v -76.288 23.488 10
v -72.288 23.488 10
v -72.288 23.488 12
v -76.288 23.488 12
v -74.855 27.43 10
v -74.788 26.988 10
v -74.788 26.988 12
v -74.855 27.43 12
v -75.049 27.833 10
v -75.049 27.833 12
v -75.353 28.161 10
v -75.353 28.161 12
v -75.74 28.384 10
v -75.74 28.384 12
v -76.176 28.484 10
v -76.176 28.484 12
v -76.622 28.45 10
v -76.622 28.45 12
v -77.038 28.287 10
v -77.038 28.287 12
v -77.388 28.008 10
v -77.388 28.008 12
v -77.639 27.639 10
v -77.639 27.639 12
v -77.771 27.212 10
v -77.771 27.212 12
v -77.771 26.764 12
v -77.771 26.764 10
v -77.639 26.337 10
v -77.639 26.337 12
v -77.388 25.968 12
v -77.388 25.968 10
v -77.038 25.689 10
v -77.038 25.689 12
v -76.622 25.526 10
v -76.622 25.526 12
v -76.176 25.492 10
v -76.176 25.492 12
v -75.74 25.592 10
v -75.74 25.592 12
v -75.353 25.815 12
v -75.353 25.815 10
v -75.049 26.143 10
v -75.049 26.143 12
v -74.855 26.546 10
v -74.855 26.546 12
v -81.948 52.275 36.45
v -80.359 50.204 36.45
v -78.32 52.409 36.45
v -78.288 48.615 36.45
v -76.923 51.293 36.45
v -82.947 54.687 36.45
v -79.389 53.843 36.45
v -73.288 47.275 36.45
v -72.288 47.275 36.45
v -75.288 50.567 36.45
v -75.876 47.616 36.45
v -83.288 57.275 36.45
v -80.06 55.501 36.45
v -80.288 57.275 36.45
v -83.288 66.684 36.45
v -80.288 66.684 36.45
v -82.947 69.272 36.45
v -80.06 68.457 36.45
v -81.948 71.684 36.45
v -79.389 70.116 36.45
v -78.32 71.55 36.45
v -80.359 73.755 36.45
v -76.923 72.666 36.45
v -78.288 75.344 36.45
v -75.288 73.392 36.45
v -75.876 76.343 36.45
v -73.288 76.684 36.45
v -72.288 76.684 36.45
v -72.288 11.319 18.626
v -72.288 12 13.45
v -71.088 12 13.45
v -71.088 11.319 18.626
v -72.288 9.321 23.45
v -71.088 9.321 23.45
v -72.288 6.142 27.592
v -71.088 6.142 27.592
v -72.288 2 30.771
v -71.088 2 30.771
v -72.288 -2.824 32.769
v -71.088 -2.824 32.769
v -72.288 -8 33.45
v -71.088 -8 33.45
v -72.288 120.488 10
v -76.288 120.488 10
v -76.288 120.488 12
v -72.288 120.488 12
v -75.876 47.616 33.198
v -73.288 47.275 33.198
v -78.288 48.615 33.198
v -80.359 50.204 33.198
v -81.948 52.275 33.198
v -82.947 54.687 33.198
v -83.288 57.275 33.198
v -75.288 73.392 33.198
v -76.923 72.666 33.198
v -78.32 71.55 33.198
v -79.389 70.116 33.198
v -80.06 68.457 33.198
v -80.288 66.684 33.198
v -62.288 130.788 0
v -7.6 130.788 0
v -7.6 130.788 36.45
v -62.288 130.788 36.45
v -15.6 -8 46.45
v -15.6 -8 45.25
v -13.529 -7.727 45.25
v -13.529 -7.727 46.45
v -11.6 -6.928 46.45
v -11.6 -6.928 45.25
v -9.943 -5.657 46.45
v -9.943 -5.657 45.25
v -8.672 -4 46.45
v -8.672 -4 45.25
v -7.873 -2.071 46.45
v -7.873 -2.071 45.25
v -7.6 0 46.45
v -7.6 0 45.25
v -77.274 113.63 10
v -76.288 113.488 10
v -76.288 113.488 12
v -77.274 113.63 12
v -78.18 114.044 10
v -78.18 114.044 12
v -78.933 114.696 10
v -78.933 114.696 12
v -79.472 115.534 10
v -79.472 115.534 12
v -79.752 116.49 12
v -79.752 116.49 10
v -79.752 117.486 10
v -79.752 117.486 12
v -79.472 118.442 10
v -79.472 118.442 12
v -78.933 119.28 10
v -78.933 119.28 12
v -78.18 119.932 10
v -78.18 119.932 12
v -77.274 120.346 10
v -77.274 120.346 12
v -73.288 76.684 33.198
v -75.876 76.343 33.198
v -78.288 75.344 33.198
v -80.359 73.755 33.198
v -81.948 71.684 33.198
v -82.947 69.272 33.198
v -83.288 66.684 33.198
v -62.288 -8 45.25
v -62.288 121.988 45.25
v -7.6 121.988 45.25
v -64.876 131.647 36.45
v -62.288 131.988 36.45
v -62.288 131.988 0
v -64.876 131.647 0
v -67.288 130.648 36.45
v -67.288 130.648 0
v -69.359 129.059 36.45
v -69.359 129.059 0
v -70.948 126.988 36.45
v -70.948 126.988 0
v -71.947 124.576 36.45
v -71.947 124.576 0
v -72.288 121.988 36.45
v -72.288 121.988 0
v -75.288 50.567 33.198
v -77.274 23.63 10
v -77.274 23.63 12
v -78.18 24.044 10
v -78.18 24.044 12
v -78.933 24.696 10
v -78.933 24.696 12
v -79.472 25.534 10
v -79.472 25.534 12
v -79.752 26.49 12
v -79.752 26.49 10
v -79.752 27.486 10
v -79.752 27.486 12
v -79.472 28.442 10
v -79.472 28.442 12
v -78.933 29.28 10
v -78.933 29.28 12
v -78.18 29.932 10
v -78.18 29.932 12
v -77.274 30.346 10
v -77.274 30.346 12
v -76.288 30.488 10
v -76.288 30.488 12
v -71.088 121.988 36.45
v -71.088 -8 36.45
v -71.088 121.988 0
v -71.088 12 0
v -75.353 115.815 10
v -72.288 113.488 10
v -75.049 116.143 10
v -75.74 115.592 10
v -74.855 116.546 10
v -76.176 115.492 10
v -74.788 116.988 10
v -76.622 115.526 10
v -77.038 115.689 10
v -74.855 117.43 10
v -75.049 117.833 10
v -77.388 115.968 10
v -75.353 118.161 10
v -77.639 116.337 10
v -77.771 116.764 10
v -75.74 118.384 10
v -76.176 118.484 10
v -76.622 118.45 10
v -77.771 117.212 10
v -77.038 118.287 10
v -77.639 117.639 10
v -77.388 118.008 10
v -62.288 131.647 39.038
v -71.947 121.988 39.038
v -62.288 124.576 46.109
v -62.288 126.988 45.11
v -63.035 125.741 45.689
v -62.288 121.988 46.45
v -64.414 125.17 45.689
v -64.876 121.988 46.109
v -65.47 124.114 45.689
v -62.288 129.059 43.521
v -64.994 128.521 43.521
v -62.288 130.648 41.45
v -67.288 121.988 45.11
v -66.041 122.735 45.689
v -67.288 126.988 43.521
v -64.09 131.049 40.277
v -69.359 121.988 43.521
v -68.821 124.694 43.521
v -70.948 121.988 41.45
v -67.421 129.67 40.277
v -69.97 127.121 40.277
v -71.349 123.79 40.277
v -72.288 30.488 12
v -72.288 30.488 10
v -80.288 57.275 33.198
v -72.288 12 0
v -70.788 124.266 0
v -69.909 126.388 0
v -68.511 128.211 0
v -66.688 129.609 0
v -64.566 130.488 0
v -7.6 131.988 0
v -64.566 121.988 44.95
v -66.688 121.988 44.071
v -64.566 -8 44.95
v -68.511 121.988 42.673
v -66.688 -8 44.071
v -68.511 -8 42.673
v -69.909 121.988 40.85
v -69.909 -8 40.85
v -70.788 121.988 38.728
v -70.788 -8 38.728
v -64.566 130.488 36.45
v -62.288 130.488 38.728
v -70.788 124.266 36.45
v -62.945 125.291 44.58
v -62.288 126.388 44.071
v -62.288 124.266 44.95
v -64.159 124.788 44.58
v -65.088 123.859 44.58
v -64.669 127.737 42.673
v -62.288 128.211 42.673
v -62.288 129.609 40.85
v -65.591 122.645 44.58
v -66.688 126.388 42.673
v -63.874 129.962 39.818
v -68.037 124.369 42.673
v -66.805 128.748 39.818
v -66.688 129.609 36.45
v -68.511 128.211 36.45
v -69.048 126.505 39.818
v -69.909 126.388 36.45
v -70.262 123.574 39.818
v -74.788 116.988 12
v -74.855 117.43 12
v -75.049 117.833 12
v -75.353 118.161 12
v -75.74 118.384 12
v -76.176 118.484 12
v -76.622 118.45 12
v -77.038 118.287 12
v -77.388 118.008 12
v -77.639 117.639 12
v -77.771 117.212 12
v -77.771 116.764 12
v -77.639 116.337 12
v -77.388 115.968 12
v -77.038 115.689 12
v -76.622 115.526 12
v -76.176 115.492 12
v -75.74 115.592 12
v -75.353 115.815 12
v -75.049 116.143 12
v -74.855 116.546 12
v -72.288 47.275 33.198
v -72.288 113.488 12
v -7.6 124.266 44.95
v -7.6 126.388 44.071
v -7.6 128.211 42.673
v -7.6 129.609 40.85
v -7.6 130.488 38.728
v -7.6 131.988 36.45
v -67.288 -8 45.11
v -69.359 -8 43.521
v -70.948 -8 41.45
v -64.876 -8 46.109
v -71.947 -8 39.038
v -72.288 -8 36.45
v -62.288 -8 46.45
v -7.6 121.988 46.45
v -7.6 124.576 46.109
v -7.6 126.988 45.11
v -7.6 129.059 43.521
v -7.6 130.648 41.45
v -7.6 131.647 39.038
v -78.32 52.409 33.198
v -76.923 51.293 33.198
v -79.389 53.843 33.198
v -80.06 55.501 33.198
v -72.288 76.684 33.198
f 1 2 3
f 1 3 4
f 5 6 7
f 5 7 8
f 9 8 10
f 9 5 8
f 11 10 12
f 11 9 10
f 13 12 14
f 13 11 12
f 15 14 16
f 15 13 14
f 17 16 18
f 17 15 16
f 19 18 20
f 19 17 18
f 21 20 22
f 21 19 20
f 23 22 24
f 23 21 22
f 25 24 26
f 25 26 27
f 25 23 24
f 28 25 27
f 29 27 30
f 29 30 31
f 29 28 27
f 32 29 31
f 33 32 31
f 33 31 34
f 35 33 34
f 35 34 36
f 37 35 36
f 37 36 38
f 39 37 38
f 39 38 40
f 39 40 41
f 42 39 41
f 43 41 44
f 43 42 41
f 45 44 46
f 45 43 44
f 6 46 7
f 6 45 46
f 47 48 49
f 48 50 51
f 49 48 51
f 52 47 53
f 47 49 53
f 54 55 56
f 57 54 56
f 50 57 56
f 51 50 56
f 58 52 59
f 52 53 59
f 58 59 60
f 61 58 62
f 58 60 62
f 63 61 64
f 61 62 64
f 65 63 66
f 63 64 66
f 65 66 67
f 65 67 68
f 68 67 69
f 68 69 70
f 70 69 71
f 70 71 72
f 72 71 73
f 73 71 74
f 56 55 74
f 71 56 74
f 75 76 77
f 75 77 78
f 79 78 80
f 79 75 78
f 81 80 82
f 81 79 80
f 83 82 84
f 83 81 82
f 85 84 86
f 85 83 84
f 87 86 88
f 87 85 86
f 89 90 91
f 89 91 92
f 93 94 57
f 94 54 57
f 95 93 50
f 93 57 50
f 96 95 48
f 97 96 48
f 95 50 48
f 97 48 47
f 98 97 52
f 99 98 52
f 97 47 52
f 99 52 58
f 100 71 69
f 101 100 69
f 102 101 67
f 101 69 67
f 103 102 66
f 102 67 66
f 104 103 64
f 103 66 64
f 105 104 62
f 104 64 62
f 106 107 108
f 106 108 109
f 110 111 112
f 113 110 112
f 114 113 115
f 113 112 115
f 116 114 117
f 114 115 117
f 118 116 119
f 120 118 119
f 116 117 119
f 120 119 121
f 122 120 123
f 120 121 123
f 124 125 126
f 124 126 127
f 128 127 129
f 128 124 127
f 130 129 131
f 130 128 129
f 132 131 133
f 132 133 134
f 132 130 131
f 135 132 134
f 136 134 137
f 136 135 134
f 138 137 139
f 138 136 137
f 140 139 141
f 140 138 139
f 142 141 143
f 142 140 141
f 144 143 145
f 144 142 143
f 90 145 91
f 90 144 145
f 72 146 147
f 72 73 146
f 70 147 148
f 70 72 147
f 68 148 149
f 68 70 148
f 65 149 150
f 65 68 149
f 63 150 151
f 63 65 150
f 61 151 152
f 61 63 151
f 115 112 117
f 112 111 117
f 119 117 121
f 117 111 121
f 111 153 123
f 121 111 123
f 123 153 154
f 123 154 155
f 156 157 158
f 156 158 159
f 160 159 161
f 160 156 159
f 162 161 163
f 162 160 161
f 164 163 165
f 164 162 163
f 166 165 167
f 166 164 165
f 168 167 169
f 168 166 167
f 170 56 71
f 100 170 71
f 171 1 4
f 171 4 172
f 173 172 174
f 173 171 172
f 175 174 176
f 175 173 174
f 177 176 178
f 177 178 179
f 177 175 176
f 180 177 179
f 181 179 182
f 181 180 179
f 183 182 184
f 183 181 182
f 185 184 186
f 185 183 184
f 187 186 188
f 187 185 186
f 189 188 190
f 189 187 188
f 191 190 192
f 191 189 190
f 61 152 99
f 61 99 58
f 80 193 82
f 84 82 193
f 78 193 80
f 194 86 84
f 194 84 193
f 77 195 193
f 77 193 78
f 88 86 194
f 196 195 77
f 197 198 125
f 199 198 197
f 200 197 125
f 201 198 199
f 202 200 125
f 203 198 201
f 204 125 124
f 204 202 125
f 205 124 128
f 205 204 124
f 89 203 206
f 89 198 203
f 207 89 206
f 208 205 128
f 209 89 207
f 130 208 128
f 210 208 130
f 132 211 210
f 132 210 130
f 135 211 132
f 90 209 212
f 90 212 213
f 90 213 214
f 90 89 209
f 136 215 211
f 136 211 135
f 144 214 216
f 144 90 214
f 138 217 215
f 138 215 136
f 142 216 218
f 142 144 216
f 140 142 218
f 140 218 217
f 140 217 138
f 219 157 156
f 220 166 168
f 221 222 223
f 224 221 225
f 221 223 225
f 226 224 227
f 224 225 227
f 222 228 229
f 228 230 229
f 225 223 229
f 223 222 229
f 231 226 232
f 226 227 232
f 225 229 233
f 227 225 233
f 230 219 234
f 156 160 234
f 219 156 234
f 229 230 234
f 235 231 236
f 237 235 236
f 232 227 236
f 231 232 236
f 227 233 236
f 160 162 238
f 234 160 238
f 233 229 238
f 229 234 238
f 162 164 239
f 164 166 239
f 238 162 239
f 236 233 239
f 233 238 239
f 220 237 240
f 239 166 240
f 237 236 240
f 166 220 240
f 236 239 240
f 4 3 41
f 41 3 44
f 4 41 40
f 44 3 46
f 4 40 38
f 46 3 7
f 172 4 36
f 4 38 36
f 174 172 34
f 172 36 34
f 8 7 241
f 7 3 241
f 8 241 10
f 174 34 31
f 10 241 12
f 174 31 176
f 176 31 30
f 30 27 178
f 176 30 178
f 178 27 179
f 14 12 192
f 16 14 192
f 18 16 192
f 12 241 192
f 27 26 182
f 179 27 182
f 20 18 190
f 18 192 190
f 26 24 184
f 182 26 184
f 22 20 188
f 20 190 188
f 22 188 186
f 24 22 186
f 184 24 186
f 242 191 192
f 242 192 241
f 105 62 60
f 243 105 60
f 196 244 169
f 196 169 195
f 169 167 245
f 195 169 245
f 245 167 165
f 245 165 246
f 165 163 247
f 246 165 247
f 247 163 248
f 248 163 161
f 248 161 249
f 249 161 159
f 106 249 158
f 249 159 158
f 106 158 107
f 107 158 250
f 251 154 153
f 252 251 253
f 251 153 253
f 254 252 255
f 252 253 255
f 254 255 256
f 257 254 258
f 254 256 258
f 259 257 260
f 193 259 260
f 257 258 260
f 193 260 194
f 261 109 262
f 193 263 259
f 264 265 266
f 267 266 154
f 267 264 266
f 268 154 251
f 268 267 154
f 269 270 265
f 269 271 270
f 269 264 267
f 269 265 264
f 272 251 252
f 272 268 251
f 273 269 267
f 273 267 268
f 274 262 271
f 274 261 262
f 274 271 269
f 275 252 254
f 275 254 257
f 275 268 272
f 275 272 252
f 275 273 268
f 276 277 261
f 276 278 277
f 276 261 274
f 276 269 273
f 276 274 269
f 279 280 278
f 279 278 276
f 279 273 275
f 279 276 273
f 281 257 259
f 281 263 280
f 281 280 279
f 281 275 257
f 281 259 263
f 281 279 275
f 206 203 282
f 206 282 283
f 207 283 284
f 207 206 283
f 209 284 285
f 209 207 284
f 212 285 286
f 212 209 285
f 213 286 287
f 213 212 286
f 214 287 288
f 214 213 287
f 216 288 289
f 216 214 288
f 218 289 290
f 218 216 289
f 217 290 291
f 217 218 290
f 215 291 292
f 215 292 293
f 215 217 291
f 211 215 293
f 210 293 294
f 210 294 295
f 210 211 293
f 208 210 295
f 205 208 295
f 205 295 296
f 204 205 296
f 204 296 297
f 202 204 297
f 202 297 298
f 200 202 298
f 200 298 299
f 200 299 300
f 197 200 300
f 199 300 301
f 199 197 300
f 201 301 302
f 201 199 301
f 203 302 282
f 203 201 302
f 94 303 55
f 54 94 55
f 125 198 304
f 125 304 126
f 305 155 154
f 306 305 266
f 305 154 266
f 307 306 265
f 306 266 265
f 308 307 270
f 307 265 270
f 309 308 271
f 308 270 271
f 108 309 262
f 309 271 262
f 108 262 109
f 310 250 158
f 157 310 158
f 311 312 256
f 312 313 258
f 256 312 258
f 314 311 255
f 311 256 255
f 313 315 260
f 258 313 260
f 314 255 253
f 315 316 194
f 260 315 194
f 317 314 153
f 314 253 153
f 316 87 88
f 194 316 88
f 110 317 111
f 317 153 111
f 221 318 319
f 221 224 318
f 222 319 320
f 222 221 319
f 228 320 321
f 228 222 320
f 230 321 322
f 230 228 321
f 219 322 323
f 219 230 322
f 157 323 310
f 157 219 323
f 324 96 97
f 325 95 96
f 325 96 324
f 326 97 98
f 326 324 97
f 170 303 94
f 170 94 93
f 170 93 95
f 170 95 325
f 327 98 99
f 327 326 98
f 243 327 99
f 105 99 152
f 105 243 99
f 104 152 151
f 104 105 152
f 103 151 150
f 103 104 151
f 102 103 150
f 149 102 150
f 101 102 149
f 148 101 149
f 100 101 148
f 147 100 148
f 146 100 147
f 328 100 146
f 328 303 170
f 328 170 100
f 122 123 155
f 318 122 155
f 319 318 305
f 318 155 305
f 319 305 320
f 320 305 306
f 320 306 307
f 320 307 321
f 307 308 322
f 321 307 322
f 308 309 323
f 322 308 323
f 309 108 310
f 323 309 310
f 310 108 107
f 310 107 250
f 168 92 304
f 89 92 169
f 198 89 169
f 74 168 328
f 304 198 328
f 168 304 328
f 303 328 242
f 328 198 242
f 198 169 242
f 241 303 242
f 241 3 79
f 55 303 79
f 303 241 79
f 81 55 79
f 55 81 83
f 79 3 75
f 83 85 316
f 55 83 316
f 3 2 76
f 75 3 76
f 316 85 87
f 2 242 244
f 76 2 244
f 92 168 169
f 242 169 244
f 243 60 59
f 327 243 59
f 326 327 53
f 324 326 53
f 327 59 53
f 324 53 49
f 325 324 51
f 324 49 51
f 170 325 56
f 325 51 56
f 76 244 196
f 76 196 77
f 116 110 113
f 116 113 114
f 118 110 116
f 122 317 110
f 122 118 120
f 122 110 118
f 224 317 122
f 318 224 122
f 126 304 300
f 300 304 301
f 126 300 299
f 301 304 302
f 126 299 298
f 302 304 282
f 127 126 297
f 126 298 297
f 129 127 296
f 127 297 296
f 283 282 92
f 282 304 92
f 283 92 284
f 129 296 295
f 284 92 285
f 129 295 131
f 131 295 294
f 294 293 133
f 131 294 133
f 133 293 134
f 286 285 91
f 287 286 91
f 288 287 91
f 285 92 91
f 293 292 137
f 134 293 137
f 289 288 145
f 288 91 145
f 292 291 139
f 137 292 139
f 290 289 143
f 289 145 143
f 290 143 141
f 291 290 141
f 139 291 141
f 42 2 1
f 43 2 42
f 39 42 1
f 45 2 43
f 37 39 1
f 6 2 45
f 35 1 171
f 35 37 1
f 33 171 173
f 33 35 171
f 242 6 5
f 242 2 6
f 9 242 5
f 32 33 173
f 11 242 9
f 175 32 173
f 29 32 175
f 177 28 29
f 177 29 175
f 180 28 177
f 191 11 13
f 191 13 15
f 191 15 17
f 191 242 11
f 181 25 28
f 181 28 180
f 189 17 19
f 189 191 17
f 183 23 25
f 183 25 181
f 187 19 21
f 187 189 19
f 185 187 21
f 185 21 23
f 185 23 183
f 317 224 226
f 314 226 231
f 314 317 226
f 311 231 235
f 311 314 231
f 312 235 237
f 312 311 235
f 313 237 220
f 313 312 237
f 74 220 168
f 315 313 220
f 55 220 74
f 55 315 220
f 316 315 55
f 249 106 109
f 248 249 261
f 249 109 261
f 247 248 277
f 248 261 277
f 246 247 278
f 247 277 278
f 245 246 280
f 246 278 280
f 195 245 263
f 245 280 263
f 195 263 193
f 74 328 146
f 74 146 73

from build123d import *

# Parameters (mm, degrees)
BOSS_EXTRUDE1_DEPTH = 46.45
FILLET1_R           = 10
FILLET2_R           = 10
SHELL1_T            = -1.2
BOSS_EXTRUDE2_START = 10
SKETCH2_R           = 1.5
BOSS_EXTRUDE2_DEPTH = 2
CUT_EXTRUDE1_DEPTH  = 1.2
SKETCH4_W           = 3.252453774
SKETCH4_H           = 29.408591544
BOSS_EXTRUDE3_DEPTH = 11
FILLET3_R           = 10
CUT_EXTRUDE2_DEPTH  = 3.252453774


with BuildPart() as part:
    # Sketch1 → Boss-Extrude1 (new body)
    with BuildSketch(Plane.XY):
        with BuildLine():
            Line((-7.6, 131.988), (-72.288, 131.988))
            Line((-72.288, 131.988), (-72.288, -8))
            Line((-72.288, -8), (-15.6, -8))
            ThreePointArc((-15.6, -8), (-9.943145751, -5.656854249), (-7.6, 0))
            Line((-7.6, 0), (-7.6, 131.988))
        make_face()
    extrude(amount=BOSS_EXTRUDE1_DEPTH)

    # Fillet1
    fillet1_edges = [part.edges().sort_by_distance(p)[0] for p in [
        (-72.288, 131.988, 23.225),
    ]]
    fillet(fillet1_edges, radius=FILLET1_R)

    # Fillet2
    fillet2_edges = [part.edges().sort_by_distance(p)[0] for p in [
        (-72.288, 56.994, 46.45),
        (-69.359067812, 129.059067812, 46.45),
        (-34.944, 131.988, 46.45),
    ]]
    fillet(fillet2_edges, radius=FILLET2_R)

    # Shell1
    shell1_openings = [part.faces().sort_by_distance(p)[0] for p in [
        (-7.6, 65.770031668, 23.151264626),
        (-43.729452835, -8, 23.052515396),
        (-9.943145751, -5.656854249, 23.225),
        (-39.918891594, 61.936645467, 0),
    ]]
    offset(amount=SHELL1_T, openings=shell1_openings, kind=Kind.INTERSECTION)

    # Sketch2 → Boss-Extrude2 (add)
    # profile 1 of 2: a face of its own
    with BuildSketch(Plane.XY.offset(BOSS_EXTRUDE2_START)):
        with BuildLine():
            Line((-76.288, 120.488), (-72.288, 120.488))
            Line((-72.288, 120.488), (-72.288, 113.488))
            Line((-72.288, 113.488), (-76.288, 113.488))
            ThreePointArc((-76.288, 113.488), (-79.788, 116.988), (-76.288, 120.488))
        make_face()
        with Locations((-76.288, 116.988)):
            Circle(SKETCH2_R, mode=Mode.SUBTRACT)
    # profile 2 of 2: a face of its own
    with BuildSketch(Plane.XY.offset(BOSS_EXTRUDE2_START)):
        with BuildLine():
            Line((-76.288, 30.488), (-72.288, 30.488))
            Line((-72.288, 30.488), (-72.288, 23.488))
            Line((-72.288, 23.488), (-76.288, 23.488))
            ThreePointArc((-76.288, 23.488), (-79.788, 26.988), (-76.288, 30.488))
        make_face()
        with Locations((-76.288, 26.988)):
            Circle(SKETCH2_R, mode=Mode.SUBTRACT)
    extrude(amount=BOSS_EXTRUDE2_DEPTH)

    # Sketch3 → Cut-Extrude1 (cut)
    with BuildSketch(Plane.ZY.offset(72.288)):
        with BuildLine():
            Line((0, 12), (13.45, 12))
            ThreePointArc((13.45, 12), (33.45, -8), (13.45, -28))
            Line((13.45, -28), (0, -28))
            ThreePointArc((0, -28), (-20, -8), (0, 12))
        make_face()
    extrude(amount=-CUT_EXTRUDE1_DEPTH, mode=Mode.SUBTRACT)

    # Sketch4 → Boss-Extrude3 (add)
    with BuildSketch(Plane.ZY.offset(72.288)):
        with Locations((34.823773113, 61.979262262)):
            Rectangle(SKETCH4_W, SKETCH4_H)
    extrude(amount=BOSS_EXTRUDE3_DEPTH)

    # Fillet3
    fillet3_edges = [part.edges().sort_by_distance(p)[0] for p in [
        (-83.288, 76.683558034, 34.823773113),
        (-83.288, 47.27496649, 34.823773113),
    ]]
    fillet(fillet3_edges, radius=FILLET3_R)

    # Sketch5 → Cut-Extrude2 (cut)
    with BuildSketch(Plane.XY.offset(36.45)):
        with BuildLine():
            Line((-80.288, 66.683558034), (-80.288, 57.27496649))
            ThreePointArc((-80.288, 57.27496649), (-78.90048608, 53.091666357), (-75.288, 50.566762558))
            Line((-75.288, 50.566762558), (-75.288, 73.391761966))
            ThreePointArc((-75.288, 73.391761966), (-78.90048608, 70.866858166), (-80.288, 66.683558034))
        make_face()
    extrude(amount=-CUT_EXTRUDE2_DEPTH, mode=Mode.SUBTRACT)


solid = part.part
